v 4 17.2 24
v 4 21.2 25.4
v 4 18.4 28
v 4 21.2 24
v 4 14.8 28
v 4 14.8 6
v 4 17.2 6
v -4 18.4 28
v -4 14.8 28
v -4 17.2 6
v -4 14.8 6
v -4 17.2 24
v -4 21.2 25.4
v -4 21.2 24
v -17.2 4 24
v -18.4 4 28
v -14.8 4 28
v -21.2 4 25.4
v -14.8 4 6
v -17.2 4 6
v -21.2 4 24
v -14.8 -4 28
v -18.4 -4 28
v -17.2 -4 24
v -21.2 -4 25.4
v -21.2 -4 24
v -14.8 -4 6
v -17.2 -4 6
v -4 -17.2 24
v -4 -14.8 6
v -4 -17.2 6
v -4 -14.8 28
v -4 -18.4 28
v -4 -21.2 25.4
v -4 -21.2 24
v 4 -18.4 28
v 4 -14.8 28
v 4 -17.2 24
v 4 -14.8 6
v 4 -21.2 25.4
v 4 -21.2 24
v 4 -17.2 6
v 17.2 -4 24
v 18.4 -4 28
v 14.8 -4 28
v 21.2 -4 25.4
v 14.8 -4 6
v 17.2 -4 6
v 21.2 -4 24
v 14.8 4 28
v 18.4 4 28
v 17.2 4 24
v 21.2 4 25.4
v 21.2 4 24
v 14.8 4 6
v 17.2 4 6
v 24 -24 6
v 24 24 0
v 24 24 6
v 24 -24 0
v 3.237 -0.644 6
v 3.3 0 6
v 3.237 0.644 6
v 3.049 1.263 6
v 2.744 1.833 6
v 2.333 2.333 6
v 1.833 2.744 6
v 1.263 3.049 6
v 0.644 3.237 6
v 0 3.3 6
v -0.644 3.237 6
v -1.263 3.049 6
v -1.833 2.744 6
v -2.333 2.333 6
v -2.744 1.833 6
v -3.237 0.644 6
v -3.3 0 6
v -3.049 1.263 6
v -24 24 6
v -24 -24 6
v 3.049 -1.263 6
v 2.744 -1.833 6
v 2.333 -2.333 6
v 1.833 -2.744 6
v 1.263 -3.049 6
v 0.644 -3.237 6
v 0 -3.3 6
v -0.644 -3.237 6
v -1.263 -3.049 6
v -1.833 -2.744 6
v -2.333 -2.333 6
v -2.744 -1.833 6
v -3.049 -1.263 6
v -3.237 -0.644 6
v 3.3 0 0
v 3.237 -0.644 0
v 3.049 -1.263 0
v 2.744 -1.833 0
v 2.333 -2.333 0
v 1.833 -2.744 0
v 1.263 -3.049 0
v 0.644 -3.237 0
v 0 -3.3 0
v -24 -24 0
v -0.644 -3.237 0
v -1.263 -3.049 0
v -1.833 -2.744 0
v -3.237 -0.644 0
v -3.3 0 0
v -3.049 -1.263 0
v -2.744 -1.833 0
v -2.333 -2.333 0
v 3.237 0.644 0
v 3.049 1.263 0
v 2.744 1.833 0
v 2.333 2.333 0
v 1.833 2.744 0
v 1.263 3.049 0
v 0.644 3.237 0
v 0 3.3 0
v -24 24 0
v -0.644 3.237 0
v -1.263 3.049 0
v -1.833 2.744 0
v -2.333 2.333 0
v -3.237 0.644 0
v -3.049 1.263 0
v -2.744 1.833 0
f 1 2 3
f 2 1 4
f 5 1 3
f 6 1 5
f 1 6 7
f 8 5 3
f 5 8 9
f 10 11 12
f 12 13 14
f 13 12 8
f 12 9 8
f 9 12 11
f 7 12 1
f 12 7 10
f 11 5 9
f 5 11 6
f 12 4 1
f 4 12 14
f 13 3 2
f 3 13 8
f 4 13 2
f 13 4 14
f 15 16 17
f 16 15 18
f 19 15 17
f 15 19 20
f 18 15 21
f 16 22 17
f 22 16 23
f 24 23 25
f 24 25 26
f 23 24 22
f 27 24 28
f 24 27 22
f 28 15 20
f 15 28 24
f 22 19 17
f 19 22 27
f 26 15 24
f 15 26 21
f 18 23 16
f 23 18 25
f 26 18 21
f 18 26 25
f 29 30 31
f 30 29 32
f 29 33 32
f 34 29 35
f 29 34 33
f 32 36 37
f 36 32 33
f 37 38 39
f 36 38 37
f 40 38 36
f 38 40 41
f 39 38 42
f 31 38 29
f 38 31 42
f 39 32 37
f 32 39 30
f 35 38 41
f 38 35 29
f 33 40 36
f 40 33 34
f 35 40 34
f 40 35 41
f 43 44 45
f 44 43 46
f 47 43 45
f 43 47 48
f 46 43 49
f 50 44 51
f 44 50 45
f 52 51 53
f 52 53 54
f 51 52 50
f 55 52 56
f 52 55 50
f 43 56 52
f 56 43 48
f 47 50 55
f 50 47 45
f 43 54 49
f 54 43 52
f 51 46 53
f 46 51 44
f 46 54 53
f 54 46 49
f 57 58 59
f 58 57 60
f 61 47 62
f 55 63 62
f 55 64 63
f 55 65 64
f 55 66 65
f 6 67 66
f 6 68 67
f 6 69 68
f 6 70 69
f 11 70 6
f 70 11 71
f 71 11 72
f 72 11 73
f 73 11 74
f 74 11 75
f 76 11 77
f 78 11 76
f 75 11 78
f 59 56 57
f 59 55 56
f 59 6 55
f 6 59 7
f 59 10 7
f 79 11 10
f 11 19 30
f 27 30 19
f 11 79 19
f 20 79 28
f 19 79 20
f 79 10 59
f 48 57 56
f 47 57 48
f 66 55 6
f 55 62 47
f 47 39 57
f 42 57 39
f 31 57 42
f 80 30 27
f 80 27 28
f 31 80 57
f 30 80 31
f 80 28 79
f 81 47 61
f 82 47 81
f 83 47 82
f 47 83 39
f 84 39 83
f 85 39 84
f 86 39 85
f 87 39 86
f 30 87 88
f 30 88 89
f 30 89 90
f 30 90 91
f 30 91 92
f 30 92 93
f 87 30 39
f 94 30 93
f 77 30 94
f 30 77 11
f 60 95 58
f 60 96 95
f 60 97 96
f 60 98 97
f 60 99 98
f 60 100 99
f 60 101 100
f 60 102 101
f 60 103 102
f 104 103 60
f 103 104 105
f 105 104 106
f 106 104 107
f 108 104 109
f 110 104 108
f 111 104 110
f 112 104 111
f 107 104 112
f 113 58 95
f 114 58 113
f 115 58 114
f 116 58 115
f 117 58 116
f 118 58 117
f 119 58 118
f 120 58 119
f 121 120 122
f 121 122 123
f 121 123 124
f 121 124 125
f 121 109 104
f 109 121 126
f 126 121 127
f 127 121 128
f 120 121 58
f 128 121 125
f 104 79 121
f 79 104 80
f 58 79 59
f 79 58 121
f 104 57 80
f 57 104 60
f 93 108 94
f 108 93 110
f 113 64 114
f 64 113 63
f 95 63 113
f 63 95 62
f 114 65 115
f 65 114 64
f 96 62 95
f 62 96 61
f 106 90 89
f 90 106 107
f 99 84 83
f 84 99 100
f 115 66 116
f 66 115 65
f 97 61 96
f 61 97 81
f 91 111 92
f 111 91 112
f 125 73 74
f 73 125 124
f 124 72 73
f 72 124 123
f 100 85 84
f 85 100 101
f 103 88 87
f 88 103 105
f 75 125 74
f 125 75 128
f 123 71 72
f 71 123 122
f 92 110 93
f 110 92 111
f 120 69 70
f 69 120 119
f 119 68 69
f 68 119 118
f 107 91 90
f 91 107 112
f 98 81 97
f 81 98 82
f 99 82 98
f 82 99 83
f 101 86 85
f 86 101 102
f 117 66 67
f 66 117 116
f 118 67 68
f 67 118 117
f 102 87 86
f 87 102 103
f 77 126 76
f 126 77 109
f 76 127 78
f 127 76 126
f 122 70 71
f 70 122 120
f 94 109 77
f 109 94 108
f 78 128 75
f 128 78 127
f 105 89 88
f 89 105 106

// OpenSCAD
$fn = 32;

// ----------------------------------------------------------------------
// Snap-fit latch: 4 arms, 22 mm tall, 4.2 mm undercut hooks
// ----------------------------------------------------------------------

// --- parameters (mm) ---
base_d = 48;              // base plate depth
base_h = 6;               // base plate thickness
span = 32;                // distance between opposite arms
arm_t = 2.4;              // arm thickness
arm_d = 8;                // arm width
height = 22;              // free arm length
head_len = 4.2;           // hook reach
head_h = 4;               // hook height
lead = 1.4;               // lead-in ramp thickness
bore_d = 6.6;             // base fixing bore
top_z = 28;               // height of the arm tips above the base

arms = 4;

difference() {
  union() {
    /* base plate, centred on the arm ring */
    translate([-24, -24, 0]) cube([base_d, base_d, base_h]);
    for (a = [0 : 360 / arms : 359]) rotate([0, 0, a]) {
    /* arm, sunk 0.5 mm into the base */
    translate([-arm_d / 2, span / 2 - arm_t / 2, base_h - 0.5]) cube([arm_d, arm_t, height + 0.5]);
    /* hook: a convex hull of a tall inner block and a thin outer lip
       gives a flat undercut below and a lead-in ramp on top */
    hull() {
      translate([-arm_d / 2, span / 2 + arm_t / 2 - 0.6, top_z - head_h]) cube([arm_d, lead + 0.4, head_h]);
      translate([-arm_d / 2, span / 2 + arm_t / 2 - 0.2, top_z - head_h]) cube([arm_d, head_len, lead]);
    }
    }
  }
  translate([0, 0, -2.5]) cylinder(h = base_h + 5, d = bore_d);
}
